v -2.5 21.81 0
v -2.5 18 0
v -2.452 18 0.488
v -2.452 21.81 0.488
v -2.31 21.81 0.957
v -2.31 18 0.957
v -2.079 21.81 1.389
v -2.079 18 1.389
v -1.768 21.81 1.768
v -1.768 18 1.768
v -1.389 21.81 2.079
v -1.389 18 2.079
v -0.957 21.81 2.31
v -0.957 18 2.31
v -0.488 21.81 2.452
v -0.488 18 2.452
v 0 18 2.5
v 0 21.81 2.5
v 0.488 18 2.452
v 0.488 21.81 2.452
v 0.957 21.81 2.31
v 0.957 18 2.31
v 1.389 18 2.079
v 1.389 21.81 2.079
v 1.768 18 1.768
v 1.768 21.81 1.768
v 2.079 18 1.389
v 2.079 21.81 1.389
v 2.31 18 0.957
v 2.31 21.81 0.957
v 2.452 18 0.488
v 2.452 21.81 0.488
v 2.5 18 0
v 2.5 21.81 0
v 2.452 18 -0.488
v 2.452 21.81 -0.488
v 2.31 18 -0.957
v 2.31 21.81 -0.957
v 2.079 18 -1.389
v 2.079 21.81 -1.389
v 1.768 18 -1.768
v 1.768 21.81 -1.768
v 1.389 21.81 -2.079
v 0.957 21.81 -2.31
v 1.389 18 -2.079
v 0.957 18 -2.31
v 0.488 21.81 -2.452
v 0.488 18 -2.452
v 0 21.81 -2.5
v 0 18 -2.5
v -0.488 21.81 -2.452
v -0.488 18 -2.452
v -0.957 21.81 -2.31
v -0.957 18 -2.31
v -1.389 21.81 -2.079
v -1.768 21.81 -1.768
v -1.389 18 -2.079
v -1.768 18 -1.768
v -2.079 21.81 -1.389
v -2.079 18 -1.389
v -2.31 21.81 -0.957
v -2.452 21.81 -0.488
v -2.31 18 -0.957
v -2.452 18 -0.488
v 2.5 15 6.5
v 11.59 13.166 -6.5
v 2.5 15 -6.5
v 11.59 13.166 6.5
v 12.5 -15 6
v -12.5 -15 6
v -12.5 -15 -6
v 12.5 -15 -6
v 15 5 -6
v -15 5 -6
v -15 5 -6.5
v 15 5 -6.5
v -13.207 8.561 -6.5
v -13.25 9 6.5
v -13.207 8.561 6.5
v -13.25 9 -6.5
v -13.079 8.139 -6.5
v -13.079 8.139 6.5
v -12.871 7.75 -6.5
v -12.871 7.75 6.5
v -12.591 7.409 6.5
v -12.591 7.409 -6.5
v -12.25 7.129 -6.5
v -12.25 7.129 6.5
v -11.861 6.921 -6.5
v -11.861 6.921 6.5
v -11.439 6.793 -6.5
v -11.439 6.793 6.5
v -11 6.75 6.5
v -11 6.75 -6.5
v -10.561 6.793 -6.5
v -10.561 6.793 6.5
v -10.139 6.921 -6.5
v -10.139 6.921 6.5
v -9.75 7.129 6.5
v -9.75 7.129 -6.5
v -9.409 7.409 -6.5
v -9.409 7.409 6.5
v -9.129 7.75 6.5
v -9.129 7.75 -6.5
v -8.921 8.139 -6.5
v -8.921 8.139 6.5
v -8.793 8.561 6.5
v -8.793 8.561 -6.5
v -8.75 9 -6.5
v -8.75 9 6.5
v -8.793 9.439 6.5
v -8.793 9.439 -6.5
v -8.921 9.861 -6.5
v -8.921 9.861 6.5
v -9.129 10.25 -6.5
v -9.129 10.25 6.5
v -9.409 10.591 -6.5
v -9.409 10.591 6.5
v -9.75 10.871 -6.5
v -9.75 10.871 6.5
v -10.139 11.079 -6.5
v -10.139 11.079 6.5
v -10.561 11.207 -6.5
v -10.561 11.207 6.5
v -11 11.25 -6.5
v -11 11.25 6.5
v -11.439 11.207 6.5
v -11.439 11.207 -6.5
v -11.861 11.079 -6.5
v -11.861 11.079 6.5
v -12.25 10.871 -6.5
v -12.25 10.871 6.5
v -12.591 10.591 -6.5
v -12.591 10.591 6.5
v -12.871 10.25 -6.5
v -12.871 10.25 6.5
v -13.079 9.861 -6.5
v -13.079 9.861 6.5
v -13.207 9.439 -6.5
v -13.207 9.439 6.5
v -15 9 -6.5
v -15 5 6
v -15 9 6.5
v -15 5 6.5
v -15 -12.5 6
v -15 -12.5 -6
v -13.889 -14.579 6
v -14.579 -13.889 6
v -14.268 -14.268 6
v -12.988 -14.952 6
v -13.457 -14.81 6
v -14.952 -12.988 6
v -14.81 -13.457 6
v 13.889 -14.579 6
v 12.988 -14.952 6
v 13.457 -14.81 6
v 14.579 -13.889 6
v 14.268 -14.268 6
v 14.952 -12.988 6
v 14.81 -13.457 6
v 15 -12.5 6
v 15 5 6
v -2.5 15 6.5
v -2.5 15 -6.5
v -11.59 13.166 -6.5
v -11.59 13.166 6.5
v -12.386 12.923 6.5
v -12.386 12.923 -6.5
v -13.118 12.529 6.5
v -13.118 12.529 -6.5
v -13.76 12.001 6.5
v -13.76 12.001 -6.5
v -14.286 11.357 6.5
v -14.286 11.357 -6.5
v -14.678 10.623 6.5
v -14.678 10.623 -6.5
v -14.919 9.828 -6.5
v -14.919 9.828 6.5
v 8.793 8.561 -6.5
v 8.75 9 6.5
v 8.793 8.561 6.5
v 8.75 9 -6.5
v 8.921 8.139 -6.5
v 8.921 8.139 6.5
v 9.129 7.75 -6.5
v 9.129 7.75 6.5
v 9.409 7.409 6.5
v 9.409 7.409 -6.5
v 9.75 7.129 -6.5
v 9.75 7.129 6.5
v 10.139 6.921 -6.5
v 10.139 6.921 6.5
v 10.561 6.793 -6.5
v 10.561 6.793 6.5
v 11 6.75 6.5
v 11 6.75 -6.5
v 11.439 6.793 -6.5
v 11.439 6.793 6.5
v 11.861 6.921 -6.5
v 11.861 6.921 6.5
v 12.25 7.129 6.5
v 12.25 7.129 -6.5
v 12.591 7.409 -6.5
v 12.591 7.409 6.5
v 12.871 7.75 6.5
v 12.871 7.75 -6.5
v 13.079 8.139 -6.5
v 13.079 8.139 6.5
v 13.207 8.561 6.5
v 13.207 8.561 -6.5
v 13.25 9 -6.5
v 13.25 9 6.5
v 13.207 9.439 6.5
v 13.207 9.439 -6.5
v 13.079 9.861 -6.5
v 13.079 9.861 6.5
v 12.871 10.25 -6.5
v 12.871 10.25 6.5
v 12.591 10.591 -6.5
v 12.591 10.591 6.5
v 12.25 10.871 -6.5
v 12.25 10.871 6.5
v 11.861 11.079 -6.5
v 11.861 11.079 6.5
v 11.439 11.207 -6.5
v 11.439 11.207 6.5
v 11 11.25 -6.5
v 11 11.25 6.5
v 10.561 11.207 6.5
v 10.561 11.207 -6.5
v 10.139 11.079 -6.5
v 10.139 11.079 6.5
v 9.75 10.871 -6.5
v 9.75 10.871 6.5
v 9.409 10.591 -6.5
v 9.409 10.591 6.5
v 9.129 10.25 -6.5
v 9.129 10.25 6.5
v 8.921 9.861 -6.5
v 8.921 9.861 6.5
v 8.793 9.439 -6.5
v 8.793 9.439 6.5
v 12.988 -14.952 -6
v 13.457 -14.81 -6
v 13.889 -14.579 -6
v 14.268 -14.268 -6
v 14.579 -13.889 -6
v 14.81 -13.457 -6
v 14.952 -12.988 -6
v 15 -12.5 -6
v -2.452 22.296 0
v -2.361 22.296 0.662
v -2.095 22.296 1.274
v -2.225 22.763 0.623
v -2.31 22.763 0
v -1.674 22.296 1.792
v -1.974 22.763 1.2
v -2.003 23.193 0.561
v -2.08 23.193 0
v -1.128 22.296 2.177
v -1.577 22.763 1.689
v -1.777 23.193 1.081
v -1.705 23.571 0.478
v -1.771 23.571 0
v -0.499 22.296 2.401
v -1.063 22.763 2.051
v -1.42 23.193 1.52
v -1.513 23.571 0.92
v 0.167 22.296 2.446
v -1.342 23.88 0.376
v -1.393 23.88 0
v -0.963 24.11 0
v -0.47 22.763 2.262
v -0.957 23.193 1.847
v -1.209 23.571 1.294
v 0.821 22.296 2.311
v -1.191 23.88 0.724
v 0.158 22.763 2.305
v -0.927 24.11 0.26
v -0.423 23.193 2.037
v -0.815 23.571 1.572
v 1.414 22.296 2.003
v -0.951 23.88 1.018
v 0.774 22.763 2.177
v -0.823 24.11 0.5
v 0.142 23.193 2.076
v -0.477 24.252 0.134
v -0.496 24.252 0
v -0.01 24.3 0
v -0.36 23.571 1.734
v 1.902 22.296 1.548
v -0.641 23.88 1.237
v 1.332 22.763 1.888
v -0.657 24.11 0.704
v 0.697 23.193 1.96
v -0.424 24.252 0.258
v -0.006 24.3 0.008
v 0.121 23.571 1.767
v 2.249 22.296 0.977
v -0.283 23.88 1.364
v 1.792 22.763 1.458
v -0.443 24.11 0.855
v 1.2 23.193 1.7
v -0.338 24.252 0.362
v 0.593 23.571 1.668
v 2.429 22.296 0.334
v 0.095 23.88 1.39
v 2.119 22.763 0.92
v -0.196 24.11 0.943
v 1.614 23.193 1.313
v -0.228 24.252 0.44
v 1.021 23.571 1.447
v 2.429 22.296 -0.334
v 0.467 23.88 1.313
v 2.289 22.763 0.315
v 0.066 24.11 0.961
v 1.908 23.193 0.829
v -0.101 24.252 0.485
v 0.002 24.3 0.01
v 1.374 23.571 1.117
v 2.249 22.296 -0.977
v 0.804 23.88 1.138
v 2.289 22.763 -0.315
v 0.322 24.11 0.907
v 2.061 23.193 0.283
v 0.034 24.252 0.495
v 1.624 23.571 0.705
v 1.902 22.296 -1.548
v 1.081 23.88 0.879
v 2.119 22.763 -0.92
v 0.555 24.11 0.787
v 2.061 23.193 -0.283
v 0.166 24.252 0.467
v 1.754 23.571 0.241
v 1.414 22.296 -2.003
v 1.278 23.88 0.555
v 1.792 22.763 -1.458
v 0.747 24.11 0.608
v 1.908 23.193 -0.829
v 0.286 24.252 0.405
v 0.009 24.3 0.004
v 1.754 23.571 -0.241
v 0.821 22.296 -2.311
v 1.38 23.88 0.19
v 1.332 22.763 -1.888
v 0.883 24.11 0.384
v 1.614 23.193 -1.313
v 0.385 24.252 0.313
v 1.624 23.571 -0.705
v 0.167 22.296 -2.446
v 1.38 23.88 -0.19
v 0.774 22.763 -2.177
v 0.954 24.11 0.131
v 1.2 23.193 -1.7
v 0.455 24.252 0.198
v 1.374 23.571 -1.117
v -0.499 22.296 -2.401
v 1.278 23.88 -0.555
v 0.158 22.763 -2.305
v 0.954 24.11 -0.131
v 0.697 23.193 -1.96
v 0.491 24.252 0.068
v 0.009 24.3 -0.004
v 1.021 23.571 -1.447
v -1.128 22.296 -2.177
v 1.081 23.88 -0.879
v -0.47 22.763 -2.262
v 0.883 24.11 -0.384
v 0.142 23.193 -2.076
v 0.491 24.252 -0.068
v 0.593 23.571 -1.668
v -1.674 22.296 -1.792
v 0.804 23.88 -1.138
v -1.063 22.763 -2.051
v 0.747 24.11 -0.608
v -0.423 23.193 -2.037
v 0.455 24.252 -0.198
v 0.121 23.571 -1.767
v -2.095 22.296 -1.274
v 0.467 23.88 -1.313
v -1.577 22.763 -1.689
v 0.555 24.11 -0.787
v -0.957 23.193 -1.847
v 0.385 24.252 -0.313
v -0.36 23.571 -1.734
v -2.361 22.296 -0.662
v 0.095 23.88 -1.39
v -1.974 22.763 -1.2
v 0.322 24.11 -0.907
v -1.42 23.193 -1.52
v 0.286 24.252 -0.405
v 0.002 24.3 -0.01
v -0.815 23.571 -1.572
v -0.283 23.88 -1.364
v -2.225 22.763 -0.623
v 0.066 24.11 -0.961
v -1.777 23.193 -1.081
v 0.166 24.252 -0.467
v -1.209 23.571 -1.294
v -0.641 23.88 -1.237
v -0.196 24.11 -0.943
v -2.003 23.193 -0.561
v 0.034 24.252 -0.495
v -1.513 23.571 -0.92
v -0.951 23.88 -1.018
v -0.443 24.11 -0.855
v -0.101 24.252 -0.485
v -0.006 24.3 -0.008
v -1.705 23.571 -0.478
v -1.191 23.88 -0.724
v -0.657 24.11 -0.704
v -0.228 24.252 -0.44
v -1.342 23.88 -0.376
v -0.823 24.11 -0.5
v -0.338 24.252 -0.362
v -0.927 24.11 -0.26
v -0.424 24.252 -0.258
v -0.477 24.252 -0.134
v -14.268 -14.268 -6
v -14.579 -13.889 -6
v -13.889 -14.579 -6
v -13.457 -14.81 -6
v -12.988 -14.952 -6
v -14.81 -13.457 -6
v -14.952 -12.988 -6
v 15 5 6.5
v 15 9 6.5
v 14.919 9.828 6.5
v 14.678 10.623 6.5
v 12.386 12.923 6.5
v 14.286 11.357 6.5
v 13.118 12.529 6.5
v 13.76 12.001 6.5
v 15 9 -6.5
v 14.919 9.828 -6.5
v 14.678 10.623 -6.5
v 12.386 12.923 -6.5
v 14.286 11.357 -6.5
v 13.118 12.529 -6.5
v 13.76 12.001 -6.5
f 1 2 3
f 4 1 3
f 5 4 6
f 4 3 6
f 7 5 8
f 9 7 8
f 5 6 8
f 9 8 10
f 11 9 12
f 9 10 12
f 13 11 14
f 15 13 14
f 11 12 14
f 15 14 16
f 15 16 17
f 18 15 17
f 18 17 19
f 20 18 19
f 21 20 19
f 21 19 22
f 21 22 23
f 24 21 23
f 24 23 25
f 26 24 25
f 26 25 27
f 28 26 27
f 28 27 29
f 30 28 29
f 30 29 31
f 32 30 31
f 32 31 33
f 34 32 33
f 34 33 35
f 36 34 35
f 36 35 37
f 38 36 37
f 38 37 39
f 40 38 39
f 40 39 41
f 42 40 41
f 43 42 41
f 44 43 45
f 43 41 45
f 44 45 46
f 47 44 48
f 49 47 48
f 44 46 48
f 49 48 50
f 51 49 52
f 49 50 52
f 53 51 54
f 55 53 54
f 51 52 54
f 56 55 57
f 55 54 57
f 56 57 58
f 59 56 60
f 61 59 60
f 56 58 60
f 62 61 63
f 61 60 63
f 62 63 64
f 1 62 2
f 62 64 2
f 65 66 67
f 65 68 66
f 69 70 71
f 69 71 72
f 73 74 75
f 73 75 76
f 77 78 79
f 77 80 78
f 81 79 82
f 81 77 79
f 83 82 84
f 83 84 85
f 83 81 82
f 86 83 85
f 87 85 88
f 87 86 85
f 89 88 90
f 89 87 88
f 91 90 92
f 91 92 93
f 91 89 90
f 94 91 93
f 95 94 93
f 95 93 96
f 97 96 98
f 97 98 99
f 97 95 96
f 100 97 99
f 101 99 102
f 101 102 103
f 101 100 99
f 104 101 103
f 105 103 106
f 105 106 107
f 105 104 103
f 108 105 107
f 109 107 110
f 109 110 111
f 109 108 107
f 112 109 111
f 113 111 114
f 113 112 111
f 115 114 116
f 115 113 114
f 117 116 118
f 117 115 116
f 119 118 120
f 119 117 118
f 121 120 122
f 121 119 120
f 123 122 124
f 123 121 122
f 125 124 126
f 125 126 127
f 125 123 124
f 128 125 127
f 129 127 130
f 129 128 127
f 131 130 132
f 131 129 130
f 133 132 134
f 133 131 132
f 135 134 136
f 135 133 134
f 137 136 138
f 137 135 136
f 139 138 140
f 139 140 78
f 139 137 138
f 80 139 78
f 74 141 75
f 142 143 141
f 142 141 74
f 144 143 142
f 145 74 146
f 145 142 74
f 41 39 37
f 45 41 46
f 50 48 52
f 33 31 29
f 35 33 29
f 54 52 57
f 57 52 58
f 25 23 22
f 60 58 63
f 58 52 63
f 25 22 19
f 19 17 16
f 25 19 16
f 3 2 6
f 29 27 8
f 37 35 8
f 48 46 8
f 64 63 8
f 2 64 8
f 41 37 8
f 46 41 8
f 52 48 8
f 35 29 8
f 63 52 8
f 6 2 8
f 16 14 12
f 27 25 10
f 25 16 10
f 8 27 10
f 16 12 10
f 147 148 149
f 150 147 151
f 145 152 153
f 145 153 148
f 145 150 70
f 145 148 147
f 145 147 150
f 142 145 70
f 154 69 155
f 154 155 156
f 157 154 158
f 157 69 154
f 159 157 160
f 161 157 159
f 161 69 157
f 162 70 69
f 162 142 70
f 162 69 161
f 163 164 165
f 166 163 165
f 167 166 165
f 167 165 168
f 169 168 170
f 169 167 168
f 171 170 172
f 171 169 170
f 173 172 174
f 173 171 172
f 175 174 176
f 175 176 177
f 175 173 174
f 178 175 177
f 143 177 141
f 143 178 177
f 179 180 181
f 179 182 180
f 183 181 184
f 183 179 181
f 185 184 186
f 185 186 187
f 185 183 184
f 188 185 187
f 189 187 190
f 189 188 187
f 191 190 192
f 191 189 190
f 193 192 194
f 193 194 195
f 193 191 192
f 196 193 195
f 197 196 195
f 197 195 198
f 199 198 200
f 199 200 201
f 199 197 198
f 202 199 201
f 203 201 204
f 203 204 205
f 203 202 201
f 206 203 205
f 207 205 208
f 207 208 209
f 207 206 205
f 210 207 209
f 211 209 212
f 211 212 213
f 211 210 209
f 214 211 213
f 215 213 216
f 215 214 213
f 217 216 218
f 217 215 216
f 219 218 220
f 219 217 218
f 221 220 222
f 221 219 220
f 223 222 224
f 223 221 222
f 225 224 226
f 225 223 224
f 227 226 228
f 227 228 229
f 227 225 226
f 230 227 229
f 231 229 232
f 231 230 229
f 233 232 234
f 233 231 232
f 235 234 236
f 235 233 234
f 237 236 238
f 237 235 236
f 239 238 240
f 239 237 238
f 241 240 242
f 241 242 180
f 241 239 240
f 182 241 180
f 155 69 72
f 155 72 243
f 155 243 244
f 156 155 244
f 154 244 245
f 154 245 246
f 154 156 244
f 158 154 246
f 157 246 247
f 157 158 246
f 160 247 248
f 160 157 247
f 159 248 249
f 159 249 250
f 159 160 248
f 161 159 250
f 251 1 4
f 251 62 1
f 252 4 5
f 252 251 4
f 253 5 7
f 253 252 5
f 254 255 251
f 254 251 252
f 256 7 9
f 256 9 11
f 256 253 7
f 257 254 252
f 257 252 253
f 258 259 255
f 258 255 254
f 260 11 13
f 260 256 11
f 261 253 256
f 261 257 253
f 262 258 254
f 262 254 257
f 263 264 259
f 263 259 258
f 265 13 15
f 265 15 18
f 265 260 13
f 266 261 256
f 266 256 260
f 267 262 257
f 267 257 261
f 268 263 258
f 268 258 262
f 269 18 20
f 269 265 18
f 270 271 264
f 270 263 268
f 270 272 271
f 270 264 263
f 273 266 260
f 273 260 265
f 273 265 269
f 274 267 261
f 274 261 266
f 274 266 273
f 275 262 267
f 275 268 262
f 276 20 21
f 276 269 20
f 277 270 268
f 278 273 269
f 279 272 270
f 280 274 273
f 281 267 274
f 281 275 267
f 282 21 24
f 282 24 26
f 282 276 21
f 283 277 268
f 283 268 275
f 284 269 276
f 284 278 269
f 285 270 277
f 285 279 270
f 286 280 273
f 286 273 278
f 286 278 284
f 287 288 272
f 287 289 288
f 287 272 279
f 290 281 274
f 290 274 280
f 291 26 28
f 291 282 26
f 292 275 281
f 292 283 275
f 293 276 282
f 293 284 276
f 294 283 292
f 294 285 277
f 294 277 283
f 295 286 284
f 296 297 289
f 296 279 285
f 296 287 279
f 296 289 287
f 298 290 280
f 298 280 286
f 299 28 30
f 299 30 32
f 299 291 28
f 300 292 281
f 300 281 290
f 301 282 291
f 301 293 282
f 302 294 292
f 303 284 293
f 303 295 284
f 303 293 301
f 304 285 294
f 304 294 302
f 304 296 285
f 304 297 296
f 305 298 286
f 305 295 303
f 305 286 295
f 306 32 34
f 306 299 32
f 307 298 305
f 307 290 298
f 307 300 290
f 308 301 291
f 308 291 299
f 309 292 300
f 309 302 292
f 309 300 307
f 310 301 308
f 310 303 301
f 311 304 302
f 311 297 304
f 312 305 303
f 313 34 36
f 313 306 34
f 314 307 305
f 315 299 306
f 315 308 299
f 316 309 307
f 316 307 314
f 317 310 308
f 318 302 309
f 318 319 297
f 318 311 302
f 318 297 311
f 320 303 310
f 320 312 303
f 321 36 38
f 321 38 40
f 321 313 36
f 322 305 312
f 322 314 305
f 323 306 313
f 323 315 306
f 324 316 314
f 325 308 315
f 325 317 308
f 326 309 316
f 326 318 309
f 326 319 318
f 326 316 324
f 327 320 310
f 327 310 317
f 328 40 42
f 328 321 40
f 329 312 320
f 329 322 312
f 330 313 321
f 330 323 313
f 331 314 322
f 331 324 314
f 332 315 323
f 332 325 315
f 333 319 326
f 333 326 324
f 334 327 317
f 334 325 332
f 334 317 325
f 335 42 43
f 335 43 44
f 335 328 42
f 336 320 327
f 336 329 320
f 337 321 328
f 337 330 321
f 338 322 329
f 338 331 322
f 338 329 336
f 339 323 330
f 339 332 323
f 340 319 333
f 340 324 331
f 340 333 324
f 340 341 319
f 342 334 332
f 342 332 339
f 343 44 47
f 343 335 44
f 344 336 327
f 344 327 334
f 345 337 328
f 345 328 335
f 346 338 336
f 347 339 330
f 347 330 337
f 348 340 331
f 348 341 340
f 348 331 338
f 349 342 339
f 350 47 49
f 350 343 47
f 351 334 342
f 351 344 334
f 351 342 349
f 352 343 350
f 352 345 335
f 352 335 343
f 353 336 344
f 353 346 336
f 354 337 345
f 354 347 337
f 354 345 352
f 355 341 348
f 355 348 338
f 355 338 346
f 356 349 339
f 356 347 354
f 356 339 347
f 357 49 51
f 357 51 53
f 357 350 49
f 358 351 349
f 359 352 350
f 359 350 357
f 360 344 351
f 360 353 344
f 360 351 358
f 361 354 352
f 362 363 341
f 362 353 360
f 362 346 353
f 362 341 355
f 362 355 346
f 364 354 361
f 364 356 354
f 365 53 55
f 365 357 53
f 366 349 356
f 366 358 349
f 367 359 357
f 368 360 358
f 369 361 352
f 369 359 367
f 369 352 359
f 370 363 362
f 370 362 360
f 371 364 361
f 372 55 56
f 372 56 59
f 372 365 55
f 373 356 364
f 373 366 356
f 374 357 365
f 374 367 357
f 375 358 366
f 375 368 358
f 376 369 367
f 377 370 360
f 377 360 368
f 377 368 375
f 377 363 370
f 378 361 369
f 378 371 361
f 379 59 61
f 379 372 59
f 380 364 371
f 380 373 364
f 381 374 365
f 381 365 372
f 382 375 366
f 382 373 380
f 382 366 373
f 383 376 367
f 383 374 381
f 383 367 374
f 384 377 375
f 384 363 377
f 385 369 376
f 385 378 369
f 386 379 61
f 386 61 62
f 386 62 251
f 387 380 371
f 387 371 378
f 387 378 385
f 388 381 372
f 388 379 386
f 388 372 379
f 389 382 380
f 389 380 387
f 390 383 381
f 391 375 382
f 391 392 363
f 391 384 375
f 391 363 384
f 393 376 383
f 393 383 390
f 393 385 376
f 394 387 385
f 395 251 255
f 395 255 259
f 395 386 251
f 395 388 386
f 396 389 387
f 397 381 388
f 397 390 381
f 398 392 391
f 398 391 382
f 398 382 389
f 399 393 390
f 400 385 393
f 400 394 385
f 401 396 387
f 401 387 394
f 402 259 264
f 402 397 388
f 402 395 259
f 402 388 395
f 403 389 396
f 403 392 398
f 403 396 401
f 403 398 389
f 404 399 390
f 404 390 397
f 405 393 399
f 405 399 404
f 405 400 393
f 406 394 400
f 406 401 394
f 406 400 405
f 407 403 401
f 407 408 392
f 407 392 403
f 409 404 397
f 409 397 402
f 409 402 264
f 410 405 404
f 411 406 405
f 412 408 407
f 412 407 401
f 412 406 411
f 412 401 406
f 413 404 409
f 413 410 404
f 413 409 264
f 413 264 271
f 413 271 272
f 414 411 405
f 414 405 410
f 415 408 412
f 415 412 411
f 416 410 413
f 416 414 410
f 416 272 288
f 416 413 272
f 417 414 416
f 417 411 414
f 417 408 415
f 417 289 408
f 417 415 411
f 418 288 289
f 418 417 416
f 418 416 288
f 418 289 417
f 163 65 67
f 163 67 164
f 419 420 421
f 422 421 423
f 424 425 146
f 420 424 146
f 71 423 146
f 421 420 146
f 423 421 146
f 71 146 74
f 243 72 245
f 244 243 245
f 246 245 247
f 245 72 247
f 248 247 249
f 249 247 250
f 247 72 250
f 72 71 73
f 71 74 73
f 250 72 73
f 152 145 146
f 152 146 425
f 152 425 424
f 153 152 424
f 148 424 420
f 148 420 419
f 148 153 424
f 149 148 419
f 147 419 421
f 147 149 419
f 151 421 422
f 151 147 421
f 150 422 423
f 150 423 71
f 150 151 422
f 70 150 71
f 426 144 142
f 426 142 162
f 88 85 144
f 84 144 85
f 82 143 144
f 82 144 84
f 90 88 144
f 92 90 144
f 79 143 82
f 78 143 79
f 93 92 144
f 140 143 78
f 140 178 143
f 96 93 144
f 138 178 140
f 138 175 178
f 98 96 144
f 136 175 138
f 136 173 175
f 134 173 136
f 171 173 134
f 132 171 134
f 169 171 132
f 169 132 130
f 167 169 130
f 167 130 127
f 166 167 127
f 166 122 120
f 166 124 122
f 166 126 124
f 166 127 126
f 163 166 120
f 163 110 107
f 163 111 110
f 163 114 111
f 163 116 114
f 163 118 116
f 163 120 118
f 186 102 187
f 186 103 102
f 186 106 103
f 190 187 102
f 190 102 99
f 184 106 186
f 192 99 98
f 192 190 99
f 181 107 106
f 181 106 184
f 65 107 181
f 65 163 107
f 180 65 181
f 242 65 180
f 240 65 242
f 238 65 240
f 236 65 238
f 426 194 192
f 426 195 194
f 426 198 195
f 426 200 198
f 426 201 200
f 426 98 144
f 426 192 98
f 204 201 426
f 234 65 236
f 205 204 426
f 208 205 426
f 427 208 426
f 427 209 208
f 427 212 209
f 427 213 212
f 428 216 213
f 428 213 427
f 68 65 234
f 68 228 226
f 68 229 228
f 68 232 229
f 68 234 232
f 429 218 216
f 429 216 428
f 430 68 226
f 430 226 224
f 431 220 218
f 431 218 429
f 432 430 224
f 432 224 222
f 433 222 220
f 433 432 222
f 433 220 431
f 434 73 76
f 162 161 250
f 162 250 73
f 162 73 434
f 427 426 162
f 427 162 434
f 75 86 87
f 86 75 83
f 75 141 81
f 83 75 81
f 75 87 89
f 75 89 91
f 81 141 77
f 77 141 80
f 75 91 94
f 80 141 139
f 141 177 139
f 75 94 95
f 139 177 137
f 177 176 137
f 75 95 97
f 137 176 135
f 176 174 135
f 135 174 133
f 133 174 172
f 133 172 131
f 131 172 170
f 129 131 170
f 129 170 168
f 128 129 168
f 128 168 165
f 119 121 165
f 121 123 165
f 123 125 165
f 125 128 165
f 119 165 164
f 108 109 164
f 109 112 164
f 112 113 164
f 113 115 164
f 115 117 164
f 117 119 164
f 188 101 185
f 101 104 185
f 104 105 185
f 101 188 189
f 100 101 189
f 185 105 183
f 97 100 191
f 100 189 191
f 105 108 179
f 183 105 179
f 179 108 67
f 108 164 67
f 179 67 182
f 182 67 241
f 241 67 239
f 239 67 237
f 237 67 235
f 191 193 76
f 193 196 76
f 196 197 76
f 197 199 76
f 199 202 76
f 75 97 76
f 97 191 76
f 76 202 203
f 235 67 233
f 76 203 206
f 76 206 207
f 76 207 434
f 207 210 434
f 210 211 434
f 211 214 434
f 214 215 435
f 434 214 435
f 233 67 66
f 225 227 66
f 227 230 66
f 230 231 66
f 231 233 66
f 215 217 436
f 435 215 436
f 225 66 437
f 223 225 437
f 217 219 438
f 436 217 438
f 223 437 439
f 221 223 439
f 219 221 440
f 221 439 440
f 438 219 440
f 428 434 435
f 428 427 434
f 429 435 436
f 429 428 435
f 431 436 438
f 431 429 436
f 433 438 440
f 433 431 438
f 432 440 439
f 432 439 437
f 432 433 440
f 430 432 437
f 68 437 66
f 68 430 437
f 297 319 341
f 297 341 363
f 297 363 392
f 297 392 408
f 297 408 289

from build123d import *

# Parameters (mm, degrees)
SKETCH1_R              = 2.25
BOSS_EXTRUDE1_DEPTH    = 6.5
SKETCH2_R              = 2.5
BOSS_EXTRUDE2_DEPTH    = 9.3
FILLET1_R              = 2.49
CUT_EXTRUDE1_START     = -20
CUT_EXTRUDE1_OUTLINE_W = 30
CUT_EXTRUDE1_OUTLINE_H = 0.5
CUT_EXTRUDE1_DEPTH     = 20
CUT_EXTRUDE4_START     = -3
SKETCH6_R              = 2.5
CUT_EXTRUDE4_DEPTH     = 3


# Read off the part's stored shape, not the designer's step: Cut-Extrude1
with BuildPart() as part:
    # Sketch1 → Boss-Extrude1 (new, symmetric)
    with BuildSketch(Plane.XY):
        with BuildLine():
            Line((-2.5, 15), (-11.59047228, 13.166066052))
            ThreePointArc((-11.59047228, 13.166066052), (-14.038959348, 11.691699538), (-15, 9))
            Line((-15, 9), (-15, -12.5))
            ThreePointArc((-15, -12.5), (-14.267766953, -14.267766953), (-12.5, -15))
            Line((-12.5, -15), (12.5, -15))
            ThreePointArc((12.5, -15), (14.267766953, -14.267766953), (15, -12.5))
            Line((15, -12.5), (15, 9))
            ThreePointArc((15, 9), (14.038959348, 11.691699538), (11.59047228, 13.166066052))
            Line((11.59047228, 13.166066052), (2.5, 15))
            Line((2.5, 15), (-2.5, 15))
        make_face()
        with Locations(Location((-11, 9, 0), (0, 0, 180))):
            Circle(SKETCH1_R, mode=Mode.SUBTRACT)
        with Locations(Location((11, 9, 0), (0, 0, 180))):
            Circle(SKETCH1_R, mode=Mode.SUBTRACT)
    extrude(amount=BOSS_EXTRUDE1_DEPTH, both=True)

    # Sketch2 → Boss-Extrude2 (add)
    with BuildSketch(Plane(origin=(0, 15, 0), x_dir=(1, 0, 0), z_dir=(0, 1, 0))):
        with Locations(Location((0, 0, 0), (0, 0, 180))):
            Circle(SKETCH2_R)
    extrude(amount=BOSS_EXTRUDE2_DEPTH)

    # Fillet1
    fillet1_edges = [part.edges().sort_by_distance(p)[0] for p in [
        (2.5, 24.3, 0),
    ]]
    fillet(fillet1_edges, radius=FILLET1_R)

    # Cut-Extrude1 outline → Cut-Extrude1 (cut)
    with BuildSketch(Plane.XZ.offset(15).offset(CUT_EXTRUDE1_START)):
        with Locations((0, -6.25)):
            Rectangle(CUT_EXTRUDE1_OUTLINE_W, CUT_EXTRUDE1_OUTLINE_H)
        with Locations((0, 6.25)):
            Rectangle(CUT_EXTRUDE1_OUTLINE_W, CUT_EXTRUDE1_OUTLINE_H)
    extrude(amount=CUT_EXTRUDE1_DEPTH, mode=Mode.SUBTRACT)

    # Sketch6 → Cut-Extrude4 (cut)
    with BuildSketch(Plane(origin=(0, 18, -31.4), x_dir=(0, 0, 1), z_dir=(0, 1, 0)).offset(CUT_EXTRUDE4_START)):
        with Locations(Location((31.4, 0, 0), (0, 0, 270))):
            Circle(SKETCH6_R)
    extrude(amount=CUT_EXTRUDE4_DEPTH, mode=Mode.SUBTRACT)


with BuildPart() as cut_extrude4_piece_1:
    # of the separate pieces the step leaves, piece 1, a body of its own (cut_extrude4_pieces)
    add(part.part.solids().sort_by_distance((2.5, 15, 6.5))[0])


with BuildPart() as cut_extrude4_piece_2:
    # of the separate pieces the step leaves, piece 2, a body of its own (cut_extrude4_pieces)
    add(part.part.solids().sort_by_distance((-2.5, 18, 0))[0])


solid = Compound([cut_extrude4_piece_1.part, cut_extrude4_piece_2.part])
